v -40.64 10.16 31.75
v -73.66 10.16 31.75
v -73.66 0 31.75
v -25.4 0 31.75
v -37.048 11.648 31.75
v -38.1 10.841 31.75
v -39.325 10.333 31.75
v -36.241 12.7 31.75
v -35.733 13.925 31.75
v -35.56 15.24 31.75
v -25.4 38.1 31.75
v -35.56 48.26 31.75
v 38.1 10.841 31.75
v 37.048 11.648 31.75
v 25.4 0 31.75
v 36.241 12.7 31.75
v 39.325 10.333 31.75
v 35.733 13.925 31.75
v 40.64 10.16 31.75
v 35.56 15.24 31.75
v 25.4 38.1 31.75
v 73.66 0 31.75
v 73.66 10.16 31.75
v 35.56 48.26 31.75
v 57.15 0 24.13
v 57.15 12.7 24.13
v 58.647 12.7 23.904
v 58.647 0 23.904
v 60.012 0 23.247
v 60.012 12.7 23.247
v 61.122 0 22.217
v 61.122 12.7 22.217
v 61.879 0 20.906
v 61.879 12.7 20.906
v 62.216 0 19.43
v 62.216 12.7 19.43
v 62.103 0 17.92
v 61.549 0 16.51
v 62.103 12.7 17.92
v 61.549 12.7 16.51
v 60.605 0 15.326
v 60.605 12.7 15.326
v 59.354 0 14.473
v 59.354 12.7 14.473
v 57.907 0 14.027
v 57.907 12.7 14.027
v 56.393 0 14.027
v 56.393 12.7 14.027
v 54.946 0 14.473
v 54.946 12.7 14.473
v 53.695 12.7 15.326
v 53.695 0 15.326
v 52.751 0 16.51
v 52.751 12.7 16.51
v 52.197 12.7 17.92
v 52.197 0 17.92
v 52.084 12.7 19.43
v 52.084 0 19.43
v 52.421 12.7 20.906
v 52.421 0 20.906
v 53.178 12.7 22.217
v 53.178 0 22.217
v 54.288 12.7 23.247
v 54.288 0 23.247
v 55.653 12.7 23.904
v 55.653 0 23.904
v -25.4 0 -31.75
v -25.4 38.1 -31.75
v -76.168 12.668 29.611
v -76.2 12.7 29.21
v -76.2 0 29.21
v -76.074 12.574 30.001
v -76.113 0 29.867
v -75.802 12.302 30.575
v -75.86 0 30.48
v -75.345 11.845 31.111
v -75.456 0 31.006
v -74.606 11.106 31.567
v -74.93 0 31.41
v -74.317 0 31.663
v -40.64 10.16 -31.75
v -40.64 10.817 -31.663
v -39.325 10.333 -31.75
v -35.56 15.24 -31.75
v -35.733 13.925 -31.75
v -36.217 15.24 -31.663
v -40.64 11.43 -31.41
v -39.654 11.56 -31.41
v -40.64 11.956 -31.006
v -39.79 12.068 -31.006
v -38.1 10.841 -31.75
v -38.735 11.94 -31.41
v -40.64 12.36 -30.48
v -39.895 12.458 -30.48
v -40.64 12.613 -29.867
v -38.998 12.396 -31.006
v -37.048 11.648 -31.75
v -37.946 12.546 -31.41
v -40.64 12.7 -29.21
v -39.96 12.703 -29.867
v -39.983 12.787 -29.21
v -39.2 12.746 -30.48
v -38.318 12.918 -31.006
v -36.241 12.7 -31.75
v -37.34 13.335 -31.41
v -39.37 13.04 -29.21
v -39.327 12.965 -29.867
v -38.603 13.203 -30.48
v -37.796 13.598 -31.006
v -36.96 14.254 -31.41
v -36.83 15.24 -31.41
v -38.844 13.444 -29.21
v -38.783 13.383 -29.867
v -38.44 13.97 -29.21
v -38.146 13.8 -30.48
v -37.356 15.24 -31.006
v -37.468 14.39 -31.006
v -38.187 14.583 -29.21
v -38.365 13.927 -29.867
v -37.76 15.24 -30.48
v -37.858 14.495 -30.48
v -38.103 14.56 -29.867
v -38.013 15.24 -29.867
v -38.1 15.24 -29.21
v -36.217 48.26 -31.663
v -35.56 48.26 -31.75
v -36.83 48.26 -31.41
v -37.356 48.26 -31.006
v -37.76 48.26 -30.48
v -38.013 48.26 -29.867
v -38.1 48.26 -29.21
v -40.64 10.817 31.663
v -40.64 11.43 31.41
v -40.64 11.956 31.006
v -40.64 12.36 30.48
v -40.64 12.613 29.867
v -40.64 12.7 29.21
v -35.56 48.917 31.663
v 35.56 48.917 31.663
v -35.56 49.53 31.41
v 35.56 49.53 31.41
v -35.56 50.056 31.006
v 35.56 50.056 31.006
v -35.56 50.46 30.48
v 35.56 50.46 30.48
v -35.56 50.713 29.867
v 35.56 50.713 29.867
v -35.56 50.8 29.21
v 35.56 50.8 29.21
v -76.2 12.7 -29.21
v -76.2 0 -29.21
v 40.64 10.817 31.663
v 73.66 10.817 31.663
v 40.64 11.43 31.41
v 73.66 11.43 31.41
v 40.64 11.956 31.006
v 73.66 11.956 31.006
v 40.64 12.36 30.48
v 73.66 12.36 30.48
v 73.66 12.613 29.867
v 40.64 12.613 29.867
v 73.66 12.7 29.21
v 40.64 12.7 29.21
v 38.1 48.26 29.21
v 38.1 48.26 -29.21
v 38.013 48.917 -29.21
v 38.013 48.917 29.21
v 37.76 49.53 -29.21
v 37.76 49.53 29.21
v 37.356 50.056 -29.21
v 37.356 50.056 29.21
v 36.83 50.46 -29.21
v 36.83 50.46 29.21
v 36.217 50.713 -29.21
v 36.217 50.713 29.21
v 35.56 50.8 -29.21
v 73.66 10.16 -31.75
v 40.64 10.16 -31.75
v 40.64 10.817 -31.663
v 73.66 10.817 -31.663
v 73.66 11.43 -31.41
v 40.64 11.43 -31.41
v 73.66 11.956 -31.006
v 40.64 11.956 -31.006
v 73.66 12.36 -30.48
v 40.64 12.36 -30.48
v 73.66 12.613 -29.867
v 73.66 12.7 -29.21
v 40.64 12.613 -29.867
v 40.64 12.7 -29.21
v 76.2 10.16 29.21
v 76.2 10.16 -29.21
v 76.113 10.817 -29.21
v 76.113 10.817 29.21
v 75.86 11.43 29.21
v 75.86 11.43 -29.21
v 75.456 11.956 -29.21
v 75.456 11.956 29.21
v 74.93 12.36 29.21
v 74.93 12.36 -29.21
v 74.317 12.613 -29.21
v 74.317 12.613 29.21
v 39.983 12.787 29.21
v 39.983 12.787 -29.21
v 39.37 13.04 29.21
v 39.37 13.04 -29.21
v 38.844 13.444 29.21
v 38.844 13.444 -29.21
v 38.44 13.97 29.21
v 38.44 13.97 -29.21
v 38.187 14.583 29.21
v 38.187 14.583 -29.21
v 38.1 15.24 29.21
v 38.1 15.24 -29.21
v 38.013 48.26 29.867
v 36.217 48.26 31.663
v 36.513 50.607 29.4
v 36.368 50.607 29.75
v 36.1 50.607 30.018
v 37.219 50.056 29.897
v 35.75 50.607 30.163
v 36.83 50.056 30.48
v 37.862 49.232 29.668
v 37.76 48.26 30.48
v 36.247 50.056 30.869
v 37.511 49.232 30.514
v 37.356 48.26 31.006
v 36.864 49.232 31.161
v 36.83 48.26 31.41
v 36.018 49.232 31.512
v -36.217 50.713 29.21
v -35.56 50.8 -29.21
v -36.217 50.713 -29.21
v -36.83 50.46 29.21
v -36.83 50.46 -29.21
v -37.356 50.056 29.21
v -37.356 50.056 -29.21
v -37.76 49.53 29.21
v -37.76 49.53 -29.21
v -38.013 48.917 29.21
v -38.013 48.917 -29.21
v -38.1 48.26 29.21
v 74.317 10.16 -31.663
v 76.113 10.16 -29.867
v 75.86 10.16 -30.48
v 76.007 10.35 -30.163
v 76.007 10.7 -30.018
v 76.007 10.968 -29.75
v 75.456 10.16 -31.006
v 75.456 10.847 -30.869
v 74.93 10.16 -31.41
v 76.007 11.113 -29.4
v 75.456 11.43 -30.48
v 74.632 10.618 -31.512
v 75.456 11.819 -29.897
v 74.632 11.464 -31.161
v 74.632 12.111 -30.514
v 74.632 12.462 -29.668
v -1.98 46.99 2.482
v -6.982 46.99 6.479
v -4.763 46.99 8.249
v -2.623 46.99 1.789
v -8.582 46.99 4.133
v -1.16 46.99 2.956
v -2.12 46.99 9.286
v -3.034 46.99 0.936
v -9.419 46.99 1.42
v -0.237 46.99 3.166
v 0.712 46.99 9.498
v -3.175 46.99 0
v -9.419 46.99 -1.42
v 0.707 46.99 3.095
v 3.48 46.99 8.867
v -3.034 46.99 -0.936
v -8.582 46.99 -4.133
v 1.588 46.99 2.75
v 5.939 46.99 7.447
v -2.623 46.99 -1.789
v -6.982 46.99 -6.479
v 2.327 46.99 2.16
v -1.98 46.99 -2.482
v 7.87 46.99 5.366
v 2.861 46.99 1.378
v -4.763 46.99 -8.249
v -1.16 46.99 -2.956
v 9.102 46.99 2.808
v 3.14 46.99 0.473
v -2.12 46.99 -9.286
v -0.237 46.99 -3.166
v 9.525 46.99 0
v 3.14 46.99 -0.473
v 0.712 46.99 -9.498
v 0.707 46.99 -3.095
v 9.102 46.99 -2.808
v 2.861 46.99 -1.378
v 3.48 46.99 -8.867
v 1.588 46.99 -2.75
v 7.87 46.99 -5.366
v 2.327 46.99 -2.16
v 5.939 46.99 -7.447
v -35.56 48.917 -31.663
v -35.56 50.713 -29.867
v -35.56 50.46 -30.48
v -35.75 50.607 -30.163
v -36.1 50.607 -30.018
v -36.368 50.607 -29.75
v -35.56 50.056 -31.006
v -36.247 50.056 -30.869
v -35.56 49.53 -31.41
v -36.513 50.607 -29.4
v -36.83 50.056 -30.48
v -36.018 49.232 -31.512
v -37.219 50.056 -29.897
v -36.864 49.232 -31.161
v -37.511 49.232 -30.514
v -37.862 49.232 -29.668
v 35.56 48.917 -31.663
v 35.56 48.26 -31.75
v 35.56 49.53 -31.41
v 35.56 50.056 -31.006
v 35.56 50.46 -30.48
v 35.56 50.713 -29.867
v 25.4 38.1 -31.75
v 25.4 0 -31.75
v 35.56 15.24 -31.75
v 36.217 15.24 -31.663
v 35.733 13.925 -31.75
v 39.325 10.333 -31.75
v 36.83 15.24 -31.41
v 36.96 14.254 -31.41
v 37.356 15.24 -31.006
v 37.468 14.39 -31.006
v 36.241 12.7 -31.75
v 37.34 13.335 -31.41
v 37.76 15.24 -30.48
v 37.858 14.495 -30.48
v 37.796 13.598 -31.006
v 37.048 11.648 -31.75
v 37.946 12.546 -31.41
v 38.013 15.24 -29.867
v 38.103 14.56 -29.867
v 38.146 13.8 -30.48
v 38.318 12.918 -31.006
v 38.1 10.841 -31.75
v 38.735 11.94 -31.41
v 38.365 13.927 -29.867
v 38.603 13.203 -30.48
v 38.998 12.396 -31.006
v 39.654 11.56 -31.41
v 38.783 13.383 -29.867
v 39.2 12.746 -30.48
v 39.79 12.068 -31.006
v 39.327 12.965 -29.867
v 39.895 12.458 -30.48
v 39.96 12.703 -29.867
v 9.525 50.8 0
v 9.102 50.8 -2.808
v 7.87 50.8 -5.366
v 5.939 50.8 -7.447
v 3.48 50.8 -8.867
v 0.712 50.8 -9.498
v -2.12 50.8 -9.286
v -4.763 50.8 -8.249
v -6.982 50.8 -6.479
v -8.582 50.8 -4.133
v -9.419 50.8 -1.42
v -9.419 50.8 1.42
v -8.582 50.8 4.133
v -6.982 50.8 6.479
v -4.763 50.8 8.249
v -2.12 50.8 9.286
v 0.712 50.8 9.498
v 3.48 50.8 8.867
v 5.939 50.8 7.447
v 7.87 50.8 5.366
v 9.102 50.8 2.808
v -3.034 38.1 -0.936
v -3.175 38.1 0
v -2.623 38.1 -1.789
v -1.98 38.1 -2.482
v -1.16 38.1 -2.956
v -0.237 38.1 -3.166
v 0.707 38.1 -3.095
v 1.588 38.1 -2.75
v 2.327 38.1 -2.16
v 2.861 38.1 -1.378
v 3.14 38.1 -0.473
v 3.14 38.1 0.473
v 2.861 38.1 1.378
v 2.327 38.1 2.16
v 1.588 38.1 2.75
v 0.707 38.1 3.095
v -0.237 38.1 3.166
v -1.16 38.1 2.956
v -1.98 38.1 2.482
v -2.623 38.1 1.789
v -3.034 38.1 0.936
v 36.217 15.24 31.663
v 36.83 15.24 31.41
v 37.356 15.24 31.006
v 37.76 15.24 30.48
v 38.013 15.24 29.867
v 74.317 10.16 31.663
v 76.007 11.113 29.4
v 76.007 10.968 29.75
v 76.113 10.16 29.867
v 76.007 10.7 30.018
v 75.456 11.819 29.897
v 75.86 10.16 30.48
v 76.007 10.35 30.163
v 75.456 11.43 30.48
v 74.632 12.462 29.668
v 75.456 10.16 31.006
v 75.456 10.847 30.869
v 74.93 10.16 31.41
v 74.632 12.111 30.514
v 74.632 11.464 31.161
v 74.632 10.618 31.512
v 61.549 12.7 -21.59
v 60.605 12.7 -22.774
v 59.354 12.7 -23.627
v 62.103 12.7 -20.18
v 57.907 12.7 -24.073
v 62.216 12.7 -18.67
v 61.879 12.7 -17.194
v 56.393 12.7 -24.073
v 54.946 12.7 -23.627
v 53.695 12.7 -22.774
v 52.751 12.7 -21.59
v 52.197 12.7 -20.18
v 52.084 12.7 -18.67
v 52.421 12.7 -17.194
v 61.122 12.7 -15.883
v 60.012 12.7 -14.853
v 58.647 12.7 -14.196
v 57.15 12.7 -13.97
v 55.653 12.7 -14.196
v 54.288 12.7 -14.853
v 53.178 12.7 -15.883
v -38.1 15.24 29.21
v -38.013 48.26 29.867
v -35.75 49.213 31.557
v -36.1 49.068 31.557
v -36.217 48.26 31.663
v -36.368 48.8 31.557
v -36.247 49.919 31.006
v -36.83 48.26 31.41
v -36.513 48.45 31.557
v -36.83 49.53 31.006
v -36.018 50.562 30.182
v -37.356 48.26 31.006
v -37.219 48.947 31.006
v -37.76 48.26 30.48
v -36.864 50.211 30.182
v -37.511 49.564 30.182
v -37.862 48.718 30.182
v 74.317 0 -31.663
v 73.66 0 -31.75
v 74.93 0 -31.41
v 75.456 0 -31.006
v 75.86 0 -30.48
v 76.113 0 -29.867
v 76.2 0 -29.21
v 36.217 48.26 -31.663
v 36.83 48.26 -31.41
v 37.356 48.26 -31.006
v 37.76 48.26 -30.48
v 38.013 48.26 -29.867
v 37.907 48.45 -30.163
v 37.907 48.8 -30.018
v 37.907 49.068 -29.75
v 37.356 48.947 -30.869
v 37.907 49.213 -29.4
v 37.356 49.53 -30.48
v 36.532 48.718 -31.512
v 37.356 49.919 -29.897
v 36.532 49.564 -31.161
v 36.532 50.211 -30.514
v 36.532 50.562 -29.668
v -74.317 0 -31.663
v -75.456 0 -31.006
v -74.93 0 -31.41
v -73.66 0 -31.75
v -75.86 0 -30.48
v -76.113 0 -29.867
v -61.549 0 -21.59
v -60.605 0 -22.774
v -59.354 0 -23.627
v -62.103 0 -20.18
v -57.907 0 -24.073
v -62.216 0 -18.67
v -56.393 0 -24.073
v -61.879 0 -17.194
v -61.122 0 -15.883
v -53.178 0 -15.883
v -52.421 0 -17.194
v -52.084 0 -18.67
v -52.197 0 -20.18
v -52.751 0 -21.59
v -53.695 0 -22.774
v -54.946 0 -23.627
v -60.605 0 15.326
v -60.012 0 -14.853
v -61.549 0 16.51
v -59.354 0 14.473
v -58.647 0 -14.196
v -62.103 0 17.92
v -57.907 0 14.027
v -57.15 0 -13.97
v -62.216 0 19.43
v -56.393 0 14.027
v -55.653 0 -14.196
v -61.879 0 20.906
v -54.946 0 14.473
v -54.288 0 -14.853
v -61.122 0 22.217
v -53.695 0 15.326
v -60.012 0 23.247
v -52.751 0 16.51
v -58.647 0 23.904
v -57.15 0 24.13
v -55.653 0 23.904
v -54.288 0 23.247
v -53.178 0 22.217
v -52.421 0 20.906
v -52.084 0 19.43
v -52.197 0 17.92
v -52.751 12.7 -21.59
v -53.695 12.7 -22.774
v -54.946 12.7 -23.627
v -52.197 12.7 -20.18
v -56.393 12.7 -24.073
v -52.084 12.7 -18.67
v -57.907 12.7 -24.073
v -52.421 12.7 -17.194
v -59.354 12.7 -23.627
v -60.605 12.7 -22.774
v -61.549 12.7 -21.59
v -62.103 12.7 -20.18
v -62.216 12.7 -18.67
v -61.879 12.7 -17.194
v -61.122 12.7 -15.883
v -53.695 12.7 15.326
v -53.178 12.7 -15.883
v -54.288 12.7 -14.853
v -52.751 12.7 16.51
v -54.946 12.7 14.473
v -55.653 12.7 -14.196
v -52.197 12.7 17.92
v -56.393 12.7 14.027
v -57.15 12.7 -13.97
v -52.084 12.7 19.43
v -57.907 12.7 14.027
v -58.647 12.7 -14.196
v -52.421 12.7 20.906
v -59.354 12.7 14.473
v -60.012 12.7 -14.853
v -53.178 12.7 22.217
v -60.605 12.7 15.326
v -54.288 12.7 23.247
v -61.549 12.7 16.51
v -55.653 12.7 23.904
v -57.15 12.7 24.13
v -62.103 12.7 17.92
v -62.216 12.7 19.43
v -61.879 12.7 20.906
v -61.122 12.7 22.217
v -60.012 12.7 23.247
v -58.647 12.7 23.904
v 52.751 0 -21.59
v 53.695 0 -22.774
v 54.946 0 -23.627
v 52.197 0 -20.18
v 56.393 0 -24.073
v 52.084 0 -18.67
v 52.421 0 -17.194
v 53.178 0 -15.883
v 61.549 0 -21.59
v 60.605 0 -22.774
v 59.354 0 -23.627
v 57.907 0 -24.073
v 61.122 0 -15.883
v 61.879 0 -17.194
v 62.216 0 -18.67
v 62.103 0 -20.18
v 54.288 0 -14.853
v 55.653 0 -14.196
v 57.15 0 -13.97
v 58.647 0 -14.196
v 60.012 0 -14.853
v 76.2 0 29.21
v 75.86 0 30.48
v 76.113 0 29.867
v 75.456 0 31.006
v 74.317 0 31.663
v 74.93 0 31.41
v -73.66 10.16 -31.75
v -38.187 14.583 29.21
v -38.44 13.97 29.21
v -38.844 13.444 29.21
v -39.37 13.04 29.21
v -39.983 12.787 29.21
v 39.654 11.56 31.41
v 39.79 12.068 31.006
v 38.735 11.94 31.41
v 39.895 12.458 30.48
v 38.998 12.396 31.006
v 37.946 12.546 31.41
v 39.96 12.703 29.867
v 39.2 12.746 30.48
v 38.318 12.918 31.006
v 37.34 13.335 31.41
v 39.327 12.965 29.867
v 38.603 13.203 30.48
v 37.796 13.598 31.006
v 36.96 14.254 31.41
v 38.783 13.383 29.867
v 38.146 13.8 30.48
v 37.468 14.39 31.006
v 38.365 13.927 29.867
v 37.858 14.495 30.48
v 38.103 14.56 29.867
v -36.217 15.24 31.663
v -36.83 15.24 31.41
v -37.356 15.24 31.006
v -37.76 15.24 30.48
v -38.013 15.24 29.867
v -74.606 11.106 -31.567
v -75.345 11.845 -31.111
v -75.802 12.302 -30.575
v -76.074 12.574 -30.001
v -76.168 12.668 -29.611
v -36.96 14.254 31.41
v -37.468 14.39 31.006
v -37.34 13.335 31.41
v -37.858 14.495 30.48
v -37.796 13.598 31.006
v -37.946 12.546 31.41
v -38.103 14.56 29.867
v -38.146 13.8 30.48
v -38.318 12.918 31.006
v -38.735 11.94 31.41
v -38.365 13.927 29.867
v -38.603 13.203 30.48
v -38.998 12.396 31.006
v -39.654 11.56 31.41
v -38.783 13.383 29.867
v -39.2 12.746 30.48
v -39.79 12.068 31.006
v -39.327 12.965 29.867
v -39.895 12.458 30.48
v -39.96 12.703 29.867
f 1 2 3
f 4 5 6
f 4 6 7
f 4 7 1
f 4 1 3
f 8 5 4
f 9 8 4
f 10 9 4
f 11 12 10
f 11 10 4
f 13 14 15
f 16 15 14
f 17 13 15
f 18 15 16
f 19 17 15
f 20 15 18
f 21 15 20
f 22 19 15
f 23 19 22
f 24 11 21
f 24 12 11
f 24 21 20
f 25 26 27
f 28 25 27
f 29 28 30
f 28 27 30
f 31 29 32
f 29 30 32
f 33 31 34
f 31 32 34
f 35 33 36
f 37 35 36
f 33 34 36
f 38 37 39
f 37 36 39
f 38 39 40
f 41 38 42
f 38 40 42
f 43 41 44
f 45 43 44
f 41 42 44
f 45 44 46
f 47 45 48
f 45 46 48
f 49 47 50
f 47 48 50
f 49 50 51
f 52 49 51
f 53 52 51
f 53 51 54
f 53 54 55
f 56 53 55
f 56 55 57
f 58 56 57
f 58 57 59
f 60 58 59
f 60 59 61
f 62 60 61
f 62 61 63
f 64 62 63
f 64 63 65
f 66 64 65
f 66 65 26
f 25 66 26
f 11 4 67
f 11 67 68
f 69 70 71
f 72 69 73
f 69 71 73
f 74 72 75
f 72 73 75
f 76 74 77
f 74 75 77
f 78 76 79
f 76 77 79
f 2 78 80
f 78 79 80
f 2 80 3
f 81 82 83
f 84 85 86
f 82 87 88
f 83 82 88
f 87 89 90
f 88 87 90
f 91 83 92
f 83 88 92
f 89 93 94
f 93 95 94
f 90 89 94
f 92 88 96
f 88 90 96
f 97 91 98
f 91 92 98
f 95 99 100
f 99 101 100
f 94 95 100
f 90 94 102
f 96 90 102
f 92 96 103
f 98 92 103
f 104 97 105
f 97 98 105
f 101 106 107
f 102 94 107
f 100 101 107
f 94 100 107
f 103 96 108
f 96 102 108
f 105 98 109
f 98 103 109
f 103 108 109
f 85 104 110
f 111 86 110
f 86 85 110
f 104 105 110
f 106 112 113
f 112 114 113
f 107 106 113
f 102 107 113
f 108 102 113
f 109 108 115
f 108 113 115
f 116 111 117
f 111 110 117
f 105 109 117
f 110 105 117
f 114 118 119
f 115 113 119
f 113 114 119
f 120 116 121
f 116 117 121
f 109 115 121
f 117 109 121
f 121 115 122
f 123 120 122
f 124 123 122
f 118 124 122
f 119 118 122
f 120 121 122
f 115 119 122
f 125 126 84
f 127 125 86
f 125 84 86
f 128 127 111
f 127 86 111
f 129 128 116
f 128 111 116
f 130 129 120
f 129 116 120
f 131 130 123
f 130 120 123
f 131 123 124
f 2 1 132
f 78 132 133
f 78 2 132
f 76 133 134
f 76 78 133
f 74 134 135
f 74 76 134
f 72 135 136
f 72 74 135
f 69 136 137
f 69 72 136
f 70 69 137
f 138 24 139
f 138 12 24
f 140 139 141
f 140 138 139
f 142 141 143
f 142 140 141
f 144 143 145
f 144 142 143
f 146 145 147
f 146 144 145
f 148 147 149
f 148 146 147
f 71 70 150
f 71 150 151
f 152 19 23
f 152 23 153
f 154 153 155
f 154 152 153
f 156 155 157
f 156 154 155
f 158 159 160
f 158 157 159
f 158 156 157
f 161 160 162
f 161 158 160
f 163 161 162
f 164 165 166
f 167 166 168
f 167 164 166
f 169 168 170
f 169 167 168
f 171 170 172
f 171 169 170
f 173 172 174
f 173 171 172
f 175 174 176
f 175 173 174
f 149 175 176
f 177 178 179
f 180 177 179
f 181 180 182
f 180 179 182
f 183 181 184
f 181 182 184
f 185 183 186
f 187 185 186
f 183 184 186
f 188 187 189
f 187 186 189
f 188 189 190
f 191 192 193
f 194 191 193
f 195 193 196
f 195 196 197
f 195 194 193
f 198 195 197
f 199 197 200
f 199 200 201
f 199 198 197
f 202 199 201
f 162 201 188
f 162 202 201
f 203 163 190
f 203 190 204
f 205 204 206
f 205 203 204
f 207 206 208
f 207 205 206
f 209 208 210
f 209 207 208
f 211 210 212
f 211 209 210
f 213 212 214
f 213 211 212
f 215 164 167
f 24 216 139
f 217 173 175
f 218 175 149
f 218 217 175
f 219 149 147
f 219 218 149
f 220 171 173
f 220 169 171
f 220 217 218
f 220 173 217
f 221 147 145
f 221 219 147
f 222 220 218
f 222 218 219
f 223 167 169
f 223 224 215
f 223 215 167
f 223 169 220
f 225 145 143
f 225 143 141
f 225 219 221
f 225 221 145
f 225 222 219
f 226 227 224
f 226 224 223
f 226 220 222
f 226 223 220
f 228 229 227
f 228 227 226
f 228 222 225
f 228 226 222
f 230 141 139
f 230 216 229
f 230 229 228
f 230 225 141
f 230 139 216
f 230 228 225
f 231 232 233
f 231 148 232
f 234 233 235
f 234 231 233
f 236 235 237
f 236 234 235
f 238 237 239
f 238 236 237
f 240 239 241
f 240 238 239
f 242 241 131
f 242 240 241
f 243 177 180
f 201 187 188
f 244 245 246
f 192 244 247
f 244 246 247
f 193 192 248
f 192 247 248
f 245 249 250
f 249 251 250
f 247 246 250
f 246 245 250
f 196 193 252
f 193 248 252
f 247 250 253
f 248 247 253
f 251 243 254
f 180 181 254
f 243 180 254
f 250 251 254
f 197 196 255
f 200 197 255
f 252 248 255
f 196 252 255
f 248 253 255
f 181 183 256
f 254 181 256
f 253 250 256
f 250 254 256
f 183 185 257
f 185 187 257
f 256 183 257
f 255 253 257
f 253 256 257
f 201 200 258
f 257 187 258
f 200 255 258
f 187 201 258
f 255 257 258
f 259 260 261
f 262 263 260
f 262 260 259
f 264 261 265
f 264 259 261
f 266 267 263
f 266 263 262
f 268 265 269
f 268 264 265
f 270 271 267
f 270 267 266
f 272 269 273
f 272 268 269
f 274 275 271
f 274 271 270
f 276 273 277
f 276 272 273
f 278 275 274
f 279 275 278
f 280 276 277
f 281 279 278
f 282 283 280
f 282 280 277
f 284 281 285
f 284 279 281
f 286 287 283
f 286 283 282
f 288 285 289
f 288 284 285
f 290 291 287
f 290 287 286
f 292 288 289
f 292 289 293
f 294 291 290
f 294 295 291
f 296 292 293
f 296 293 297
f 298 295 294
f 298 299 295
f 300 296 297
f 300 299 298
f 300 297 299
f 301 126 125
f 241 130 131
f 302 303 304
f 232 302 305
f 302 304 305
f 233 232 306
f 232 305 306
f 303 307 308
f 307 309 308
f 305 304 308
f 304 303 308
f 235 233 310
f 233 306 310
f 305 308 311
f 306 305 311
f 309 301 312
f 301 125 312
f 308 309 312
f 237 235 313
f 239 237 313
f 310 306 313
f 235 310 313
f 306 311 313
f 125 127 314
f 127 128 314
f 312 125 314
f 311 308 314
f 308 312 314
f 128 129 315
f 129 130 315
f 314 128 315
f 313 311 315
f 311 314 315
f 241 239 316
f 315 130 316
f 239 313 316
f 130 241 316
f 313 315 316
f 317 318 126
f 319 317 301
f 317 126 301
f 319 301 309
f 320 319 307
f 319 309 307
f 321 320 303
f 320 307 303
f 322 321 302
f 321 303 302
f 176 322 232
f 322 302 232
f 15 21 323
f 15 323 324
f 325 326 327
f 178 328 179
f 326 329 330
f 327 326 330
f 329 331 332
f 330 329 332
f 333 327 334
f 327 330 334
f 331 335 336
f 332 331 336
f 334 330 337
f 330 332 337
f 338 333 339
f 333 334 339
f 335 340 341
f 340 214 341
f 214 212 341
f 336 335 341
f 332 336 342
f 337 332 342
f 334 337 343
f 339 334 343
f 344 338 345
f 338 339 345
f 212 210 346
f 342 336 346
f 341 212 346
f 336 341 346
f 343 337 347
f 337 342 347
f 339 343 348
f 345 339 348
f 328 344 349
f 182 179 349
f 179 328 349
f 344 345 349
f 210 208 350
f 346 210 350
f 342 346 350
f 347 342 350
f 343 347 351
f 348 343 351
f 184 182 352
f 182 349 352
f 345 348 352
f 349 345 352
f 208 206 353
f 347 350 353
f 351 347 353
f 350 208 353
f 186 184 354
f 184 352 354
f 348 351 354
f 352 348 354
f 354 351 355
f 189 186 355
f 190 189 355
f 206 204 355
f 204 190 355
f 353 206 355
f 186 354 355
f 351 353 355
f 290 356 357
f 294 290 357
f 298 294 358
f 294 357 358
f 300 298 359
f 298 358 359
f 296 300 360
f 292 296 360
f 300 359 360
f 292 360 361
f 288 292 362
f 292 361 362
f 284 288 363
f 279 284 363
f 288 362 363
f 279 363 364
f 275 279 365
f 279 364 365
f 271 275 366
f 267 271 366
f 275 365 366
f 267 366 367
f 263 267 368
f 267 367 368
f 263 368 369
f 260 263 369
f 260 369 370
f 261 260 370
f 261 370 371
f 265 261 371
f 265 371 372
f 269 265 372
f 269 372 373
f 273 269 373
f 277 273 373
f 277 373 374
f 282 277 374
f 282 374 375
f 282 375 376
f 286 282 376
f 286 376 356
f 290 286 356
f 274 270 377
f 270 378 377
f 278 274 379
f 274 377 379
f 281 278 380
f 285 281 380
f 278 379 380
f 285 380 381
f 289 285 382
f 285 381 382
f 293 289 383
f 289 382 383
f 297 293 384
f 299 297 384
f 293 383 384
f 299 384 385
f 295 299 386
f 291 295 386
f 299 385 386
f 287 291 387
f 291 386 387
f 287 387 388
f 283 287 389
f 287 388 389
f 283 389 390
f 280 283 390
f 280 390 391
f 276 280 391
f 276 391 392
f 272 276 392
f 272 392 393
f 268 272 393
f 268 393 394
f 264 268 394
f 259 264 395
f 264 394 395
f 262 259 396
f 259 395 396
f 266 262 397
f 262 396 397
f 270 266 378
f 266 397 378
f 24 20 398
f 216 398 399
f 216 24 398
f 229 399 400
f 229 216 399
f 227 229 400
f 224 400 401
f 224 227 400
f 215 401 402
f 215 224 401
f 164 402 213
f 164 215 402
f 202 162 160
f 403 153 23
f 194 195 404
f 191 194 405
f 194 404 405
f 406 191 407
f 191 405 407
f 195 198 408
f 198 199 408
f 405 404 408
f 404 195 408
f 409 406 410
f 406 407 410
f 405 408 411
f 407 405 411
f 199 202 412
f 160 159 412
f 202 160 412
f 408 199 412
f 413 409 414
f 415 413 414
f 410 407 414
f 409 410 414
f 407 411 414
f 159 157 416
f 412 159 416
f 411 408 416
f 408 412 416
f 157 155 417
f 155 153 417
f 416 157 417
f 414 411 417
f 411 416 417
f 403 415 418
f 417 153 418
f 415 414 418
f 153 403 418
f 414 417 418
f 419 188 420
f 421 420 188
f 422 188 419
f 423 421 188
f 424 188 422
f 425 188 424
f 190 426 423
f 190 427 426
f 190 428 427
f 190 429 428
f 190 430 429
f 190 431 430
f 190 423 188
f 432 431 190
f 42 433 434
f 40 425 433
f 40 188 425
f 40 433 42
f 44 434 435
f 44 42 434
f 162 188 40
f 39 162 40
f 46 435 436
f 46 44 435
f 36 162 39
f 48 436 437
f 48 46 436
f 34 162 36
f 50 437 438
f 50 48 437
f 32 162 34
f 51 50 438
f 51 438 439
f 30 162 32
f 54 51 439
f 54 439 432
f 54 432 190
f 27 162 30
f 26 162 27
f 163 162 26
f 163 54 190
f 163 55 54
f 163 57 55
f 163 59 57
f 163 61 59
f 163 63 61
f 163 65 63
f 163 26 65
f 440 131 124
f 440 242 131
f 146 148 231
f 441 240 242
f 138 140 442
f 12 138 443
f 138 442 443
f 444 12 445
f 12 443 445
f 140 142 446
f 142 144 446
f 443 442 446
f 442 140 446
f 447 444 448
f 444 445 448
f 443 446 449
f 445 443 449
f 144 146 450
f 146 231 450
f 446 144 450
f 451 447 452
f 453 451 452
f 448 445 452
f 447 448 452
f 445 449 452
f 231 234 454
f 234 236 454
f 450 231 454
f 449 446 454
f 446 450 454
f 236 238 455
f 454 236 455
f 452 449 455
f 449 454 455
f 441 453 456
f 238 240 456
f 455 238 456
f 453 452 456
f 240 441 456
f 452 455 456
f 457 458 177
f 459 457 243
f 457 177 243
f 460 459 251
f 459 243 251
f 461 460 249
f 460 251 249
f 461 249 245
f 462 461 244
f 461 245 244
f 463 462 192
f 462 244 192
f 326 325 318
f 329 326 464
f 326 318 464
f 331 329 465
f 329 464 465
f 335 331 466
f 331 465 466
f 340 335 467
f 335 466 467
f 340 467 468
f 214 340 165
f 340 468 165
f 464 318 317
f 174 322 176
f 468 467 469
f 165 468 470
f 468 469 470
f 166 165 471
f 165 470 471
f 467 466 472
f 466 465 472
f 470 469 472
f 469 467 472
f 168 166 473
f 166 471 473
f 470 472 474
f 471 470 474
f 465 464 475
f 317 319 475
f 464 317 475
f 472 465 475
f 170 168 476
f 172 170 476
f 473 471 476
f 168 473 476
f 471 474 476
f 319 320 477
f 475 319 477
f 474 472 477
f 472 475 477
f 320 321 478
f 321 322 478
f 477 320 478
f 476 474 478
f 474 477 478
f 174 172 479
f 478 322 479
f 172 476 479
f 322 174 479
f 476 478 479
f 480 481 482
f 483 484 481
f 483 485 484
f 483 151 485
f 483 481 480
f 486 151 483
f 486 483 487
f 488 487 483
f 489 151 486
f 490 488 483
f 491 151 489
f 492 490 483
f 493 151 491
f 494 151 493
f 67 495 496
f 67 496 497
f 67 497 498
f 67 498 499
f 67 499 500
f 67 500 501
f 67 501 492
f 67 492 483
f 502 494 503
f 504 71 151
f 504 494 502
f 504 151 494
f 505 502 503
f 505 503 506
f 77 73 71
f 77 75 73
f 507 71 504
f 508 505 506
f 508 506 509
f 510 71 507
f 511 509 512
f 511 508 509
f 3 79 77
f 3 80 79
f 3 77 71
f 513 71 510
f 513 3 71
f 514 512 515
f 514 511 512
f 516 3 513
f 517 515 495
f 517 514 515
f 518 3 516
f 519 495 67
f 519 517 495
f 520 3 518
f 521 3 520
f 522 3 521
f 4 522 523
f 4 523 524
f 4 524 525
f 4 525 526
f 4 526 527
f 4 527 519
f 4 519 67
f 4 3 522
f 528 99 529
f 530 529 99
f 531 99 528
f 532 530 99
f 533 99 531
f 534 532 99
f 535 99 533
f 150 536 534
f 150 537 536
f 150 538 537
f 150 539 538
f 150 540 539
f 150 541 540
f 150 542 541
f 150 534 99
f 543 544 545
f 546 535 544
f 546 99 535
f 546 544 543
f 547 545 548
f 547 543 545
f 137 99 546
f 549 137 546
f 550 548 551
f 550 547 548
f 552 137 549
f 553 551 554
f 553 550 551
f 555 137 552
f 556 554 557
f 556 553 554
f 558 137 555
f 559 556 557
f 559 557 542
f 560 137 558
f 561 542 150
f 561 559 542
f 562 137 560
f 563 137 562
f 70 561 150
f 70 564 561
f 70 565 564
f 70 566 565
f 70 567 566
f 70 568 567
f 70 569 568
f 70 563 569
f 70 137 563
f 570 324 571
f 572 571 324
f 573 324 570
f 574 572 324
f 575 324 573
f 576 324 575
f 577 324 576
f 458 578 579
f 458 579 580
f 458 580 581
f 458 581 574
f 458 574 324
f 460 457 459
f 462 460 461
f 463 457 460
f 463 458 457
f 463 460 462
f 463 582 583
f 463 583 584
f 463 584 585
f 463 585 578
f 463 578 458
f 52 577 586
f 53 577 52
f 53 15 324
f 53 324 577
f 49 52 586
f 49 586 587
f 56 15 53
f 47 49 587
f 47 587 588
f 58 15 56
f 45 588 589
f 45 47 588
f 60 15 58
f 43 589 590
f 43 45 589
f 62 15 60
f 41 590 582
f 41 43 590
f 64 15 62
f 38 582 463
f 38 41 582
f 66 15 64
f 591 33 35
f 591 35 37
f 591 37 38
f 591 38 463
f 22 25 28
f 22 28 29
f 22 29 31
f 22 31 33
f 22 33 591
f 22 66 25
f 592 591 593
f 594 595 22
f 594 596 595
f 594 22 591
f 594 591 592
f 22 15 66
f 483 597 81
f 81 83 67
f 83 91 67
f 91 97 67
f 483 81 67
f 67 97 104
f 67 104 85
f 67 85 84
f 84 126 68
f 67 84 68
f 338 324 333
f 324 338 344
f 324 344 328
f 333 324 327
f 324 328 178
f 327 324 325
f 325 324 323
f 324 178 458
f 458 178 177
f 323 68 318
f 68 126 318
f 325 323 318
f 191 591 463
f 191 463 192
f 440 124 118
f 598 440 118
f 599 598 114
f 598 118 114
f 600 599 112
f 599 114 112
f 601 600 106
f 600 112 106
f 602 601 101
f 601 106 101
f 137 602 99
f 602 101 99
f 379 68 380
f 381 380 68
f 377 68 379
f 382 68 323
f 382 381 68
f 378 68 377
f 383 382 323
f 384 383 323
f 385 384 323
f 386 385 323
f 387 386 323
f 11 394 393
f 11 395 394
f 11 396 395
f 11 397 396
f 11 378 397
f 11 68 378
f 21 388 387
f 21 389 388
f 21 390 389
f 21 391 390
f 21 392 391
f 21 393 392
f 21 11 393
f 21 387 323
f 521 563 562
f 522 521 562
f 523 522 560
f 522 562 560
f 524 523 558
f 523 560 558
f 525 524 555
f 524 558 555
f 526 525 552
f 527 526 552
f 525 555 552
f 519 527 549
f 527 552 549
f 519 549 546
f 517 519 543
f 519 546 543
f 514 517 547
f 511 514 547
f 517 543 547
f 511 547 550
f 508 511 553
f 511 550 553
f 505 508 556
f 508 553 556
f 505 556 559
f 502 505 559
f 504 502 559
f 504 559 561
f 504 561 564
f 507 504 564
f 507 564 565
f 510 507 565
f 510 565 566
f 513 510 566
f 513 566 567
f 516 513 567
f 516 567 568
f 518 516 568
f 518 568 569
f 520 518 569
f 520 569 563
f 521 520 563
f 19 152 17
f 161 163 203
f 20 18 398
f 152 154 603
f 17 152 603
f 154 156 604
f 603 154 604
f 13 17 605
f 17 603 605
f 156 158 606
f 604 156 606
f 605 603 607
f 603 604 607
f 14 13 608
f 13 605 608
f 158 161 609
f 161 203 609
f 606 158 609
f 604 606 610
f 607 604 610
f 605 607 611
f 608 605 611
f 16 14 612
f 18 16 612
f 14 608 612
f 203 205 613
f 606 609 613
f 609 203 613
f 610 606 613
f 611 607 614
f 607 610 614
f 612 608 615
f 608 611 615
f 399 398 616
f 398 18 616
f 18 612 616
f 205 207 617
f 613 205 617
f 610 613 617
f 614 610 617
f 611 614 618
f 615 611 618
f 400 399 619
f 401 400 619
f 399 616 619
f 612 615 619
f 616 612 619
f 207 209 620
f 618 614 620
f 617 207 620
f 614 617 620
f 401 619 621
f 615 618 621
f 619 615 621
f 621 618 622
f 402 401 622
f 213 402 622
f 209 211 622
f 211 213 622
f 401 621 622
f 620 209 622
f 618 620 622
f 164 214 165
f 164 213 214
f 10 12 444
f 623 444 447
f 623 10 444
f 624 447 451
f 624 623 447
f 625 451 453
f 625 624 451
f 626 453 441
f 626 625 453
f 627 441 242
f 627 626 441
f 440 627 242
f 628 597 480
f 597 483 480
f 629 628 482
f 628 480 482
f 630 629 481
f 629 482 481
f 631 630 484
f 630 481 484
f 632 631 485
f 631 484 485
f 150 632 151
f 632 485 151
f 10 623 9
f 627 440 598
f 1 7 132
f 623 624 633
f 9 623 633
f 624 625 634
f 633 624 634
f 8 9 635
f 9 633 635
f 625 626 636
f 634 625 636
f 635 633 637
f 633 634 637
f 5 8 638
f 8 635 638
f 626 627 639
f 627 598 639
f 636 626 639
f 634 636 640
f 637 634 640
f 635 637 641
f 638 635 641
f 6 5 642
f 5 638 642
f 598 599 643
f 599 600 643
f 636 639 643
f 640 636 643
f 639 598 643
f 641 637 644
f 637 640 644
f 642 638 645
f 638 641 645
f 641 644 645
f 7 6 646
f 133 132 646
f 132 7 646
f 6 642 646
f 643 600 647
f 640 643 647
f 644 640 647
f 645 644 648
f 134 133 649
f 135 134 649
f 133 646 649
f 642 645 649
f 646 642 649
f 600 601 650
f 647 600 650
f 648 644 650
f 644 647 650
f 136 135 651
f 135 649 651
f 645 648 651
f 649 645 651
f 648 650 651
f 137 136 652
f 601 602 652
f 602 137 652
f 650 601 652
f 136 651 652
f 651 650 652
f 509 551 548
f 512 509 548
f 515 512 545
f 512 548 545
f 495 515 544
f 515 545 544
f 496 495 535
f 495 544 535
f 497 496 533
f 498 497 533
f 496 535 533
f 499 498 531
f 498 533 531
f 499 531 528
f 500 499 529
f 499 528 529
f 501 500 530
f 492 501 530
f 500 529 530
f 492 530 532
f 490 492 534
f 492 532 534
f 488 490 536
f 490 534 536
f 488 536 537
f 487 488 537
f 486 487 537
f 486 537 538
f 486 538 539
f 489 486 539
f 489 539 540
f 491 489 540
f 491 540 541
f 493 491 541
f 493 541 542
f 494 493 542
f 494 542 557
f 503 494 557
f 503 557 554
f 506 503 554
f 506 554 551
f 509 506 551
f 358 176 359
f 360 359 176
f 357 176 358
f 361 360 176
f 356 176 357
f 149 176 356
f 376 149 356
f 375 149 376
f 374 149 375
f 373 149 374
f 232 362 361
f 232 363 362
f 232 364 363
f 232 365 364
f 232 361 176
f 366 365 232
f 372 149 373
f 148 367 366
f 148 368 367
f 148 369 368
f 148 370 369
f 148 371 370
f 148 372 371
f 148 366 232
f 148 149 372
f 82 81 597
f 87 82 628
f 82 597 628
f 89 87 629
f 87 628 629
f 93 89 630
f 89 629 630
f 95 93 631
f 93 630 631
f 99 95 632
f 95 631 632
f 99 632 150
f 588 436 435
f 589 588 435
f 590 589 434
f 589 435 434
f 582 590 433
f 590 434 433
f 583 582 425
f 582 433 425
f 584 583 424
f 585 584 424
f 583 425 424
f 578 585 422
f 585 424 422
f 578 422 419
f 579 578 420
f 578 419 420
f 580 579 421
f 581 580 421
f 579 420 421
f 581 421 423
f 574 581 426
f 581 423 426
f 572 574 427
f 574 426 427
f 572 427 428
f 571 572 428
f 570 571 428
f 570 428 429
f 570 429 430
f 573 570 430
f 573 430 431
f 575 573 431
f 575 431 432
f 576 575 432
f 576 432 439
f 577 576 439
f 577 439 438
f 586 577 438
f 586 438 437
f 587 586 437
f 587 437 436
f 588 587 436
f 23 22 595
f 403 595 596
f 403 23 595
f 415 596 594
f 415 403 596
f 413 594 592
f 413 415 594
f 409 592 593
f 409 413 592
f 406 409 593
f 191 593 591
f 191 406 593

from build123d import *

# Parameters (mm, degrees)
EXTRUDE_THIN1_DEPTH                                 = 31.75
CBORE_FOR_00_BINDING_HEAD_MACHINE_SCREW_D           = 6.35
CBORE_FOR_00_BINDING_HEAD_MACHINE_SCREW_CBORE_D     = 19.05
CBORE_FOR_00_BINDING_HEAD_MACHINE_SCREW_CBORE_DEPTH = 3.81
SKETCH7_R                                           = 5.08
CUT_EXTRUDE1_DEPTH                                  = 91.918163752
LPATTERN1_COUNT                                     = 2
LPATTERN1_PITCH                                     = 38.1
LPATTERN1_COUNT_DIR2                                = 2
LPATTERN1_PITCH_DIR2                                = 114.3
FILLET1_R                                           = 2.54


with BuildPart() as part:
    # Sketch1 → Extrude-Thin1 (new, symmetric)
    with BuildSketch(Plane.XY):
        Polygon((-76.2, 0), (-25.4, 0), (-25.4, 38.1), (25.4, 38.1), (25.4, 0), (76.2, 0), (76.2, 12.7), (38.1, 12.7), (38.1, 50.8), (-38.1, 50.8), (-38.1, 12.7), (-76.2, 12.7), align=None)
    extrude(amount=EXTRUDE_THIN1_DEPTH, both=True)

    # CBORE for #00 Binding Head Machine Screw2 (through all)
    with Locations(Plane(origin=(0, 50.8, 0), x_dir=(1, 0, 0), z_dir=(0, 1, 0))):
        with Locations((0, 0)):
            CounterBoreHole(CBORE_FOR_00_BINDING_HEAD_MACHINE_SCREW_D / 2, CBORE_FOR_00_BINDING_HEAD_MACHINE_SCREW_CBORE_D / 2, CBORE_FOR_00_BINDING_HEAD_MACHINE_SCREW_CBORE_DEPTH)

    # Sketch7 → Cut-Extrude1 (cut, through all)
    with BuildSketch(Plane(origin=(0, 12.7, 0), x_dir=(1, 0, 0), z_dir=(0, 1, 0))):
        with Locations(Location((-57.15, -19.05, 0), (0, 0, 270))):
            Circle(SKETCH7_R)
    cut_extrude1 = extrude(amount=-CUT_EXTRUDE1_DEPTH, mode=Mode.SUBTRACT)

    # LPattern1: Cut-Extrude1 2 × 2
    with Locations(*[(j * LPATTERN1_PITCH_DIR2, 0, -i * LPATTERN1_PITCH) for i in range(LPATTERN1_COUNT) for j in range(LPATTERN1_COUNT_DIR2) if (i, j) != (0, 0)]):
        add(cut_extrude1, mode=Mode.SUBTRACT)

    # Fillet1
    fillet1_edges = [part.edges().sort_by_distance(p)[0] for p in [
        (-76.2, 6.35, -31.75),
        (-57.15, 12.7, -31.75),
        (-38.1, 31.75, -31.75),
        (0, 50.8, -31.75),
        (57.15, 12.7, 31.75),
        (38.1, 31.75, -31.75),
        (57.15, 12.7, -31.75),
        (76.2, 6.35, -31.75),
        (38.1, 31.75, 31.75),
        (-38.1, 12.7, 0),
        (-38.1, 50.8, 0),
        (38.1, 50.8, 0),
        (38.1, 12.7, 0),
        (76.2, 12.7, 0),
        (0, 50.8, 31.75),
        (-38.1, 31.75, 31.75),
        (-57.15, 12.7, 31.75),
        (-76.2, 6.35, 31.75),
        (76.2, 6.35, 31.75),
    ]]
    fillet(fillet1_edges, radius=FILLET1_R)


solid = part.part
